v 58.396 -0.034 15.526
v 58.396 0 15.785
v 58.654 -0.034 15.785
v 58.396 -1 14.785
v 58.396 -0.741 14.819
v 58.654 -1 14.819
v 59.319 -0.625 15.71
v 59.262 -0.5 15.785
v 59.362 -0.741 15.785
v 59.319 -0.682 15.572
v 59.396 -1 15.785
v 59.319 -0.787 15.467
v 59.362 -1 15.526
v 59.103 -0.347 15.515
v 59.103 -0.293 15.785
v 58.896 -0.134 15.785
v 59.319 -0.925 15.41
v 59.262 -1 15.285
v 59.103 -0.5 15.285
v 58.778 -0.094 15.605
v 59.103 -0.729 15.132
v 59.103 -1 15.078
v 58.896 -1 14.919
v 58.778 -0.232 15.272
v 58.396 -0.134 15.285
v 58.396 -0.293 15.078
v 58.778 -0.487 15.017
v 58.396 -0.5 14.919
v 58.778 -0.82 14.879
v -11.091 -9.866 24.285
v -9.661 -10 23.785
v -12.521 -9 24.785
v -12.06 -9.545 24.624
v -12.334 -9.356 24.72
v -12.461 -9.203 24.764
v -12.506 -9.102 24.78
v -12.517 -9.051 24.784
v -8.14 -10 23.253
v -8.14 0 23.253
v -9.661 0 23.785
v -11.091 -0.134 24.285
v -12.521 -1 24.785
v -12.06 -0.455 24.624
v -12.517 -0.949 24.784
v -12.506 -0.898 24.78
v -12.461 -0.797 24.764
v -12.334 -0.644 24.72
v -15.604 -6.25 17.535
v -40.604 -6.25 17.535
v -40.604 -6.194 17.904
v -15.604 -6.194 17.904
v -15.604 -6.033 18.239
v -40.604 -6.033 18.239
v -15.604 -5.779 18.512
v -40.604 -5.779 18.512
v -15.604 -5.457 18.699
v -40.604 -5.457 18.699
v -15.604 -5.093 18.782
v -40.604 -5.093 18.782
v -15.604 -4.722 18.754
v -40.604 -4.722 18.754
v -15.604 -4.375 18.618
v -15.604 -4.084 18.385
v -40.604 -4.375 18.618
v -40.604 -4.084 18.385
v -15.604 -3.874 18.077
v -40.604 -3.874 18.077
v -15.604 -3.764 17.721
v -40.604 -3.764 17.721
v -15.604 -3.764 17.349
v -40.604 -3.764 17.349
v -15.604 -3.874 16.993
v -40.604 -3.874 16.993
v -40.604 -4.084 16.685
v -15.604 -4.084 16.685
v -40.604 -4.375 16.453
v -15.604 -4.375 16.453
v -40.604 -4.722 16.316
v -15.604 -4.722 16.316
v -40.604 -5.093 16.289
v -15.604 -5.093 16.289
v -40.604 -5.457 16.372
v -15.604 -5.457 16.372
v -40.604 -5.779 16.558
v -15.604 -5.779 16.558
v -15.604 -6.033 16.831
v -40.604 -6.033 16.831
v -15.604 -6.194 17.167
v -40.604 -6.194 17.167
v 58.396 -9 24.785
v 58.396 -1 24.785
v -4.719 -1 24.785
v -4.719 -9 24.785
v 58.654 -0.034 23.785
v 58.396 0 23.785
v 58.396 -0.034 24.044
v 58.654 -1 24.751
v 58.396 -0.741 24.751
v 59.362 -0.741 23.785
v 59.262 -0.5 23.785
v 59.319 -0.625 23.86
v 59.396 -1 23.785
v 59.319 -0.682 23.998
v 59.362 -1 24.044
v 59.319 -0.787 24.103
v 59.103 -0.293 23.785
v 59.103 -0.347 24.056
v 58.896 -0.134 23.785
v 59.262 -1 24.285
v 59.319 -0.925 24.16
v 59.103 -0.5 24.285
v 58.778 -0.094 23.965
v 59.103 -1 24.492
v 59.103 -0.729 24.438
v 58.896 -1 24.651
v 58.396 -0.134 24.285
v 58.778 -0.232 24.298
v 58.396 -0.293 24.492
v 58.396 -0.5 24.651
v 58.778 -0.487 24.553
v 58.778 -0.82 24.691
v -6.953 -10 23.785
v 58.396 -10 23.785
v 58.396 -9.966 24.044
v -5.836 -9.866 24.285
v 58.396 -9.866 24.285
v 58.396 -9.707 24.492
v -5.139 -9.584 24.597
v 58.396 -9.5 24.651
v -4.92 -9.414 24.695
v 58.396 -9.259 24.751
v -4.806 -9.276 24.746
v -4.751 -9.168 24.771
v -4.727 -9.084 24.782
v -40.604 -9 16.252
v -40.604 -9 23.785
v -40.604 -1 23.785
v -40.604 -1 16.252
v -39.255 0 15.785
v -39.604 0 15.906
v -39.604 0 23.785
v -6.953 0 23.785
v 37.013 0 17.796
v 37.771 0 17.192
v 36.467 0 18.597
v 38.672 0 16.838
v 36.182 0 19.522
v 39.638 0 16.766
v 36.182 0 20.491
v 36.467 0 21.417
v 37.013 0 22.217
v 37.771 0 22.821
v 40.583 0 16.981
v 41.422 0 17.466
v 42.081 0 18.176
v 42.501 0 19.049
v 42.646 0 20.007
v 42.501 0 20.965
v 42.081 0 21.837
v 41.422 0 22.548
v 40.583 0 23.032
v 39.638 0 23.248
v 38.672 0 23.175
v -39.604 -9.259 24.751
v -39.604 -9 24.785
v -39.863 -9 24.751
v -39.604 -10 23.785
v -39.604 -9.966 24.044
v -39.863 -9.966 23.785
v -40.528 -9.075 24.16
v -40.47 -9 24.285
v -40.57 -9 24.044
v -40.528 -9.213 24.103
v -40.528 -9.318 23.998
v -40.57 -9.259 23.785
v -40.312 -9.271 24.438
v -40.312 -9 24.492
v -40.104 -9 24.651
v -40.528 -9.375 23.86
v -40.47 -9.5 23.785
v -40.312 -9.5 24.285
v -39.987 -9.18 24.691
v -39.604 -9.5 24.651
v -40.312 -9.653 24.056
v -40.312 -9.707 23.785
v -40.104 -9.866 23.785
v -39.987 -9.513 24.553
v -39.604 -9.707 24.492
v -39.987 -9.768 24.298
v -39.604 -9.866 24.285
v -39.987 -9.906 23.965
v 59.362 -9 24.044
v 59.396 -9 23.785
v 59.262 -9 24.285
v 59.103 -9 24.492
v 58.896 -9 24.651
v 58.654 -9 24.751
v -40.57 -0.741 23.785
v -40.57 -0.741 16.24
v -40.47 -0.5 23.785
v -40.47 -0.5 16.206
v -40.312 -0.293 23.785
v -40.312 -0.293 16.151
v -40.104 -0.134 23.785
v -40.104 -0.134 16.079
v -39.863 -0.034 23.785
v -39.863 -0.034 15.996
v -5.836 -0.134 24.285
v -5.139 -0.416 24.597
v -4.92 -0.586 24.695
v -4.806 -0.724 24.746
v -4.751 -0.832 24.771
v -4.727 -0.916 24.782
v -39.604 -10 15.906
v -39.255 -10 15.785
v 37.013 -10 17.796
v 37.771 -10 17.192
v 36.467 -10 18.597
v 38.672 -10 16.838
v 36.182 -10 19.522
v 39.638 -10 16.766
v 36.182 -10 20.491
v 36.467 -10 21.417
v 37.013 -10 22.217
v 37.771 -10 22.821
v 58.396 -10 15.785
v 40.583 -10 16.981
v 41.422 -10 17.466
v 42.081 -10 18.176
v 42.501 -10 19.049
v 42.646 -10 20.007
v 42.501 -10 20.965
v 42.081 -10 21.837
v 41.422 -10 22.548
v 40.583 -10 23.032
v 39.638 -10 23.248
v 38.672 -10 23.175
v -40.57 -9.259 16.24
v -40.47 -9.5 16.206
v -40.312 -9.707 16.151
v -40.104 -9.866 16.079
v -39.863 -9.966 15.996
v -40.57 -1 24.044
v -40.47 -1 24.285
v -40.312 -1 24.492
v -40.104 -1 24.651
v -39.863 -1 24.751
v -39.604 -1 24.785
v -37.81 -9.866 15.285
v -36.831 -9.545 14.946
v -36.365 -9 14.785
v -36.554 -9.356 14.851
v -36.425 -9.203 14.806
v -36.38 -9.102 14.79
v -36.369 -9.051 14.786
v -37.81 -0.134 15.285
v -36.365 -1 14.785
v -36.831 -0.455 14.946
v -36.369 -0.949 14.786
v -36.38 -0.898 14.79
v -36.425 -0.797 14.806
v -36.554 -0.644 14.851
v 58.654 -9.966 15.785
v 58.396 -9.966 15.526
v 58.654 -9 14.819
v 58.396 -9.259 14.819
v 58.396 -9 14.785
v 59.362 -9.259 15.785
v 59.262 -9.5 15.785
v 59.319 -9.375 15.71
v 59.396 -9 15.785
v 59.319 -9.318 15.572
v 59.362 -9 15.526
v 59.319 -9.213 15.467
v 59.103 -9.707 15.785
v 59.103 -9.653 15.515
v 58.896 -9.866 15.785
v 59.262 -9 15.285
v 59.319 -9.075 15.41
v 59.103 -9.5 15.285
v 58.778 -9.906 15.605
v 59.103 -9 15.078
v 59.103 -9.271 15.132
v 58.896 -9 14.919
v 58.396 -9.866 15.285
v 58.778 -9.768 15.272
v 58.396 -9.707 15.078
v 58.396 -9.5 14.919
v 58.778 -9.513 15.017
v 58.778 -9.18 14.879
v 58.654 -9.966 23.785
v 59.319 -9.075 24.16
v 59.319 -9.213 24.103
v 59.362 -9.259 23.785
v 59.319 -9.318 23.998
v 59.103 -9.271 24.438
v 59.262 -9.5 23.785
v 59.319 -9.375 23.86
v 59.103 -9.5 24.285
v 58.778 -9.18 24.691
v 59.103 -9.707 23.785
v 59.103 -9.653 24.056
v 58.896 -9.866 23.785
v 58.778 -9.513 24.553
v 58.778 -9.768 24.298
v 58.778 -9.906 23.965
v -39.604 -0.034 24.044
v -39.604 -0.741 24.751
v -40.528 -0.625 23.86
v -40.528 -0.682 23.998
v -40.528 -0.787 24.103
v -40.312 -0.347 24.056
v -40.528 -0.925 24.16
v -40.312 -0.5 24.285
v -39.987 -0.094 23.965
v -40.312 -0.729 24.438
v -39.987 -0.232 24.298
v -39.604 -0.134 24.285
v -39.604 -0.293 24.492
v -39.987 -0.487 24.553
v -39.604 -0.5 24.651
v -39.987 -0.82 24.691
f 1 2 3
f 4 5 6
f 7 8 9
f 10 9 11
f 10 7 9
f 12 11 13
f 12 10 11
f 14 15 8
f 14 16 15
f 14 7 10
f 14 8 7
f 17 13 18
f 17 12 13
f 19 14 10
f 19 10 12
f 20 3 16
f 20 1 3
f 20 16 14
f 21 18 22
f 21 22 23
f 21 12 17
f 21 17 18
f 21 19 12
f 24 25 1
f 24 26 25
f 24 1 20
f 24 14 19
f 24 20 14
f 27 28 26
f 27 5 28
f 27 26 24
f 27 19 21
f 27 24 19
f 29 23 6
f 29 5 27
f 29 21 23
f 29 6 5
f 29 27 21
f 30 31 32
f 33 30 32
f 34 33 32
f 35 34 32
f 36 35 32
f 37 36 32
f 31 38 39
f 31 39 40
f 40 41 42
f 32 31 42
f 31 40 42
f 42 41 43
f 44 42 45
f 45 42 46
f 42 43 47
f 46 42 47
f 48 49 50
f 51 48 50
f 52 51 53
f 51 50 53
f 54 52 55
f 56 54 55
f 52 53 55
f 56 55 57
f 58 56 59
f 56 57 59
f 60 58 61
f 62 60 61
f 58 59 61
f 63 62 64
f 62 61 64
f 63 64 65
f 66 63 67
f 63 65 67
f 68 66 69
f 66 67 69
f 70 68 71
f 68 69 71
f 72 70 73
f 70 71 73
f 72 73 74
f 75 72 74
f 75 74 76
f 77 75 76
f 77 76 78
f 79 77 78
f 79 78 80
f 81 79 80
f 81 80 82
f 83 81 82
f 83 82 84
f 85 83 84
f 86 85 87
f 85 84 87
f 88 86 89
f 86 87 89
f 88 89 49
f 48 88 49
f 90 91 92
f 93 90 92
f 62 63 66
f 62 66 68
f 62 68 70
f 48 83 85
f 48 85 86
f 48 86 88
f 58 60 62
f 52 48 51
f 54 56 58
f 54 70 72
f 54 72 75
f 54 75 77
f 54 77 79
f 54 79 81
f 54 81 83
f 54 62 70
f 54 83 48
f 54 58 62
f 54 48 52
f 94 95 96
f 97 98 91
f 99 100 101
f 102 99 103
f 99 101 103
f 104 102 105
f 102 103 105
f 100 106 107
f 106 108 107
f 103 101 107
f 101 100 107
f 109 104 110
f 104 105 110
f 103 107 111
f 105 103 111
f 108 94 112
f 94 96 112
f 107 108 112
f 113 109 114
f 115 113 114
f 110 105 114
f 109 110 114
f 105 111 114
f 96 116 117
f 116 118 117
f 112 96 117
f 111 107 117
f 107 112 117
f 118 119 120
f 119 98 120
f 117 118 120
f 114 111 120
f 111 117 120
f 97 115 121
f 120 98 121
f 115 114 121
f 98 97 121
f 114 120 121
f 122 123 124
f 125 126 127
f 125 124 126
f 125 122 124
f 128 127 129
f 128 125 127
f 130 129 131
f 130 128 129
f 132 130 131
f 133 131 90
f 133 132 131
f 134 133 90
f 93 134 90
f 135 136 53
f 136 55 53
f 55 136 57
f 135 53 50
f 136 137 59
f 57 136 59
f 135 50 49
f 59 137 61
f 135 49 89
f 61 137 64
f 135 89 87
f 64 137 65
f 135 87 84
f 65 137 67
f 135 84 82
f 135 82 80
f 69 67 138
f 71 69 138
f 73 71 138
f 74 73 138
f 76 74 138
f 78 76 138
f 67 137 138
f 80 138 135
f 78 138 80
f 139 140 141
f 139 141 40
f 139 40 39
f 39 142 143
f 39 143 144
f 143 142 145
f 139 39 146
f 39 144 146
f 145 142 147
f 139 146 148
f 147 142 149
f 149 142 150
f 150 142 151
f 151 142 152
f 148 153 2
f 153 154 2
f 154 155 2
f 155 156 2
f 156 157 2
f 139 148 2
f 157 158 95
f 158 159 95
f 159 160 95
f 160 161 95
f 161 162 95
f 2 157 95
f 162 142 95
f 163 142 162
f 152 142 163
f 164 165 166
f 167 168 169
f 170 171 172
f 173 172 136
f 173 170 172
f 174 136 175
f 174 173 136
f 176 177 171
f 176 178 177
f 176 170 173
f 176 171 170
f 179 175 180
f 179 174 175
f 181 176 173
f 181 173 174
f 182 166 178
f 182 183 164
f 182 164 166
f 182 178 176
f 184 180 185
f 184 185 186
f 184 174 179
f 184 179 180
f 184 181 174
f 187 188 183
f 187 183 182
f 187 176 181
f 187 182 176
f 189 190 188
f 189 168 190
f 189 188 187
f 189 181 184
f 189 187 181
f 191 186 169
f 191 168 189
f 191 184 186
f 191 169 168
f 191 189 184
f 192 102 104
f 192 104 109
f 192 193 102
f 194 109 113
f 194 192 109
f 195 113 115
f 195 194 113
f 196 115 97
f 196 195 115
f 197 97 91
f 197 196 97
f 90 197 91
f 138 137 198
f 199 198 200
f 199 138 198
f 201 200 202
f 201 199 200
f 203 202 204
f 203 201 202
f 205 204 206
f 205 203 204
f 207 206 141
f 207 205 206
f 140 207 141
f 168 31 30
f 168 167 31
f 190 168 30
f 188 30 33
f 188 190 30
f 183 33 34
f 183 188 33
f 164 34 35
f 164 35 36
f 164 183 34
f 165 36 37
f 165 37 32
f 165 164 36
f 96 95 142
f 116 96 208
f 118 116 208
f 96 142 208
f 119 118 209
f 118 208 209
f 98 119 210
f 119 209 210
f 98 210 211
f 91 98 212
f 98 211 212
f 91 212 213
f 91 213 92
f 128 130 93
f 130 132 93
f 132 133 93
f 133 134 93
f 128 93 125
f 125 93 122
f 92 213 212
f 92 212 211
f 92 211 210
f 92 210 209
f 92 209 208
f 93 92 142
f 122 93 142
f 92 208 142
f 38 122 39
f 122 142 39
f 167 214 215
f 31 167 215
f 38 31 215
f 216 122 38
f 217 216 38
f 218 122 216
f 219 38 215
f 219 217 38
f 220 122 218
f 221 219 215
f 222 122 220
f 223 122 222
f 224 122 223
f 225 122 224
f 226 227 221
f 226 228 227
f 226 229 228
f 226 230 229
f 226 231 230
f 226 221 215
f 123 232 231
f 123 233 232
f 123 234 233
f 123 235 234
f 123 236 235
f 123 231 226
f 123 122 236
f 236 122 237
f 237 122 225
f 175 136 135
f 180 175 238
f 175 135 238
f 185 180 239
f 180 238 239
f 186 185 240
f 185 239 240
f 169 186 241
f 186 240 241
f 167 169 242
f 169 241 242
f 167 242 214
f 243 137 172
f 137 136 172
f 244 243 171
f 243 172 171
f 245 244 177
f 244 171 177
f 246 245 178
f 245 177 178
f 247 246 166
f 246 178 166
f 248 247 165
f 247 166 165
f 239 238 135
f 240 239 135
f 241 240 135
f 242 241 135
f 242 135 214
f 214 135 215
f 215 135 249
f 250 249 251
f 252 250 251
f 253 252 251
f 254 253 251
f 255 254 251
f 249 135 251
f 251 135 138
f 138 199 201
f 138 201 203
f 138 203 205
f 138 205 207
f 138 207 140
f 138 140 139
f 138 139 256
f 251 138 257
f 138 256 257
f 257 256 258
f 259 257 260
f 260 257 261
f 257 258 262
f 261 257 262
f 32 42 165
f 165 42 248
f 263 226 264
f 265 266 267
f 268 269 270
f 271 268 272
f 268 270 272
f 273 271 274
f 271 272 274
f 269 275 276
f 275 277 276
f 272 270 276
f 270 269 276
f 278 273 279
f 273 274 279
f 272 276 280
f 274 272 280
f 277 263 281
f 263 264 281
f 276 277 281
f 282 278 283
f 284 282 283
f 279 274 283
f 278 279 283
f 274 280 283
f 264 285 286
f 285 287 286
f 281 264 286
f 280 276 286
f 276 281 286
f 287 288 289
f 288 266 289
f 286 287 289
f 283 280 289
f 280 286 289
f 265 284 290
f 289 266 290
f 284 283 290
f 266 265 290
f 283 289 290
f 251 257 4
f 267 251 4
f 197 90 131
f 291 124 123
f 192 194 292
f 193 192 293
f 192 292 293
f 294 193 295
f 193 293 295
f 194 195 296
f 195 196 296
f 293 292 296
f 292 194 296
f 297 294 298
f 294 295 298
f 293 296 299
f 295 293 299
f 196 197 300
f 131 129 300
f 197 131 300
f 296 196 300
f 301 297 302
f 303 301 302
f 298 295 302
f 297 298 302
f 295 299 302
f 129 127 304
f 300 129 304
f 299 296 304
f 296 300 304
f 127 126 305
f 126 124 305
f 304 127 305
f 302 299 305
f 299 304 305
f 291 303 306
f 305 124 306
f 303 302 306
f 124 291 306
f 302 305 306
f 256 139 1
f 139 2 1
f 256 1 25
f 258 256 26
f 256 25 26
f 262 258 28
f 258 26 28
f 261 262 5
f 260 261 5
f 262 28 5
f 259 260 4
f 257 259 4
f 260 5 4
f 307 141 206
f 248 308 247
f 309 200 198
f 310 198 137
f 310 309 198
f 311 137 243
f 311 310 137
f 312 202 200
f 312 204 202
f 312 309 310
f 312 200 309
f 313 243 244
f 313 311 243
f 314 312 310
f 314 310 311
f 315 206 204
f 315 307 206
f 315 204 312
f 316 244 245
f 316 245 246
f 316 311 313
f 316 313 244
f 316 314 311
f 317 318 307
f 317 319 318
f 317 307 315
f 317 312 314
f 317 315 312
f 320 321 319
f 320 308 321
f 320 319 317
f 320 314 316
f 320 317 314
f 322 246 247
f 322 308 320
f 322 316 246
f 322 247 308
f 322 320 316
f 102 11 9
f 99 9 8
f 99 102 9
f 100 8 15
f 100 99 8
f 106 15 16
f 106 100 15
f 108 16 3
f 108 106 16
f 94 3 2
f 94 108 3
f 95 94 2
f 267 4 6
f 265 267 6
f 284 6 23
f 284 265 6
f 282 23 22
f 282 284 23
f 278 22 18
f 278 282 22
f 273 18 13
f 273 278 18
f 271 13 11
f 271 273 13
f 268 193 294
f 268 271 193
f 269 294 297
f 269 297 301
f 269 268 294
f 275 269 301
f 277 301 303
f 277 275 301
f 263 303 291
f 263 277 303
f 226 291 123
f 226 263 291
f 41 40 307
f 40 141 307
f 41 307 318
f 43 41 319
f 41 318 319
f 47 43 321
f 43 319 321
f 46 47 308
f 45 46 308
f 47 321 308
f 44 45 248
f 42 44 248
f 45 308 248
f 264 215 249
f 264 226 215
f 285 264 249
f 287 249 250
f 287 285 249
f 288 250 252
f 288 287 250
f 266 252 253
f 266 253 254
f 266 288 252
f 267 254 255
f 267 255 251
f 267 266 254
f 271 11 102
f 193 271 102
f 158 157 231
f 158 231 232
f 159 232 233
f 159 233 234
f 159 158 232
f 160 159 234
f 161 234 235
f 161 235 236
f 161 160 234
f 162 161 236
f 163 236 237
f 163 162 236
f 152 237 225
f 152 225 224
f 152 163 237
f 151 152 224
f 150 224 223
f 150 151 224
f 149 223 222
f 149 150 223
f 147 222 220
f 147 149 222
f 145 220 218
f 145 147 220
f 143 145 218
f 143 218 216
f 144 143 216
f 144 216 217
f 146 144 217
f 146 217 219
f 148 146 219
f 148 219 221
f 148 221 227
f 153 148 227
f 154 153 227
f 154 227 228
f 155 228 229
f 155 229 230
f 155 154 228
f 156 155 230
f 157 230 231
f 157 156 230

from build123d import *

# Parameters (mm, degrees)
F0_R     = 3.25
F1_DEPTH = 10
F2_R     = 1.25
F3_DEPTH = 25
F4_R     = 1
F5_R     = 1


with BuildPart() as f1:
    # F0 (on Front) → F1 (new body)
    with BuildSketch(Plane.XZ):
        Polygon((-40.604423, 16.252205), (-36.365006, 14.785099), (59.395577, 14.785099), (59.395577, 24.785099), (-4.71925, 24.785099), (-8.140423, 23.253271), (-12.521202, 24.785099), (-40.604423, 24.785099), align=None)
        with Locations((39.395577, 20.006654)):
            Circle(F0_R, mode=Mode.SUBTRACT)
    extrude(amount=F1_DEPTH)

    # F2 (on face) → F3 (cut)
    with BuildSketch(Plane(origin=(-40.604423, 0, 0), x_dir=(0, -1, 0), z_dir=(-1, 0, 0))):
        with Locations((5, 17.535099)):
            Circle(F2_R)
    extrude(amount=-F3_DEPTH, mode=Mode.SUBTRACT)

    # F4
    f4_edges = [f1.edges().sort_by_distance(p)[0] for p in [
        (-26.562812, -10, 24.785099),
        (27.338164, -10, 24.785099),
        (27.338164, 0, 24.785099),
        (-26.562812, 0, 24.785099),
        (-40.604423, 0, 20.518652),
        (-40.604423, -5, 24.785099),
        (-40.604423, -10, 20.518652),
    ]]
    fillet(f4_edges, radius=F4_R)

    # F5
    f5_edges = [f1.edges().sort_by_distance(p)[0] for p in [
        (11.515286, -10, 14.785099),
        (11.515286, 0, 14.785099),
        (59.395577, -5, 24.785099),
        (59.395577, -0.292893, 24.492206),
        (59.395577, -9.707107, 24.492206),
        (59.395577, 0, 19.285099),
        (59.395577, -10, 19.285099),
        (59.395577, -5, 14.785099),
    ]]
    fillet(f5_edges, radius=F5_R)


solid = f1.part
